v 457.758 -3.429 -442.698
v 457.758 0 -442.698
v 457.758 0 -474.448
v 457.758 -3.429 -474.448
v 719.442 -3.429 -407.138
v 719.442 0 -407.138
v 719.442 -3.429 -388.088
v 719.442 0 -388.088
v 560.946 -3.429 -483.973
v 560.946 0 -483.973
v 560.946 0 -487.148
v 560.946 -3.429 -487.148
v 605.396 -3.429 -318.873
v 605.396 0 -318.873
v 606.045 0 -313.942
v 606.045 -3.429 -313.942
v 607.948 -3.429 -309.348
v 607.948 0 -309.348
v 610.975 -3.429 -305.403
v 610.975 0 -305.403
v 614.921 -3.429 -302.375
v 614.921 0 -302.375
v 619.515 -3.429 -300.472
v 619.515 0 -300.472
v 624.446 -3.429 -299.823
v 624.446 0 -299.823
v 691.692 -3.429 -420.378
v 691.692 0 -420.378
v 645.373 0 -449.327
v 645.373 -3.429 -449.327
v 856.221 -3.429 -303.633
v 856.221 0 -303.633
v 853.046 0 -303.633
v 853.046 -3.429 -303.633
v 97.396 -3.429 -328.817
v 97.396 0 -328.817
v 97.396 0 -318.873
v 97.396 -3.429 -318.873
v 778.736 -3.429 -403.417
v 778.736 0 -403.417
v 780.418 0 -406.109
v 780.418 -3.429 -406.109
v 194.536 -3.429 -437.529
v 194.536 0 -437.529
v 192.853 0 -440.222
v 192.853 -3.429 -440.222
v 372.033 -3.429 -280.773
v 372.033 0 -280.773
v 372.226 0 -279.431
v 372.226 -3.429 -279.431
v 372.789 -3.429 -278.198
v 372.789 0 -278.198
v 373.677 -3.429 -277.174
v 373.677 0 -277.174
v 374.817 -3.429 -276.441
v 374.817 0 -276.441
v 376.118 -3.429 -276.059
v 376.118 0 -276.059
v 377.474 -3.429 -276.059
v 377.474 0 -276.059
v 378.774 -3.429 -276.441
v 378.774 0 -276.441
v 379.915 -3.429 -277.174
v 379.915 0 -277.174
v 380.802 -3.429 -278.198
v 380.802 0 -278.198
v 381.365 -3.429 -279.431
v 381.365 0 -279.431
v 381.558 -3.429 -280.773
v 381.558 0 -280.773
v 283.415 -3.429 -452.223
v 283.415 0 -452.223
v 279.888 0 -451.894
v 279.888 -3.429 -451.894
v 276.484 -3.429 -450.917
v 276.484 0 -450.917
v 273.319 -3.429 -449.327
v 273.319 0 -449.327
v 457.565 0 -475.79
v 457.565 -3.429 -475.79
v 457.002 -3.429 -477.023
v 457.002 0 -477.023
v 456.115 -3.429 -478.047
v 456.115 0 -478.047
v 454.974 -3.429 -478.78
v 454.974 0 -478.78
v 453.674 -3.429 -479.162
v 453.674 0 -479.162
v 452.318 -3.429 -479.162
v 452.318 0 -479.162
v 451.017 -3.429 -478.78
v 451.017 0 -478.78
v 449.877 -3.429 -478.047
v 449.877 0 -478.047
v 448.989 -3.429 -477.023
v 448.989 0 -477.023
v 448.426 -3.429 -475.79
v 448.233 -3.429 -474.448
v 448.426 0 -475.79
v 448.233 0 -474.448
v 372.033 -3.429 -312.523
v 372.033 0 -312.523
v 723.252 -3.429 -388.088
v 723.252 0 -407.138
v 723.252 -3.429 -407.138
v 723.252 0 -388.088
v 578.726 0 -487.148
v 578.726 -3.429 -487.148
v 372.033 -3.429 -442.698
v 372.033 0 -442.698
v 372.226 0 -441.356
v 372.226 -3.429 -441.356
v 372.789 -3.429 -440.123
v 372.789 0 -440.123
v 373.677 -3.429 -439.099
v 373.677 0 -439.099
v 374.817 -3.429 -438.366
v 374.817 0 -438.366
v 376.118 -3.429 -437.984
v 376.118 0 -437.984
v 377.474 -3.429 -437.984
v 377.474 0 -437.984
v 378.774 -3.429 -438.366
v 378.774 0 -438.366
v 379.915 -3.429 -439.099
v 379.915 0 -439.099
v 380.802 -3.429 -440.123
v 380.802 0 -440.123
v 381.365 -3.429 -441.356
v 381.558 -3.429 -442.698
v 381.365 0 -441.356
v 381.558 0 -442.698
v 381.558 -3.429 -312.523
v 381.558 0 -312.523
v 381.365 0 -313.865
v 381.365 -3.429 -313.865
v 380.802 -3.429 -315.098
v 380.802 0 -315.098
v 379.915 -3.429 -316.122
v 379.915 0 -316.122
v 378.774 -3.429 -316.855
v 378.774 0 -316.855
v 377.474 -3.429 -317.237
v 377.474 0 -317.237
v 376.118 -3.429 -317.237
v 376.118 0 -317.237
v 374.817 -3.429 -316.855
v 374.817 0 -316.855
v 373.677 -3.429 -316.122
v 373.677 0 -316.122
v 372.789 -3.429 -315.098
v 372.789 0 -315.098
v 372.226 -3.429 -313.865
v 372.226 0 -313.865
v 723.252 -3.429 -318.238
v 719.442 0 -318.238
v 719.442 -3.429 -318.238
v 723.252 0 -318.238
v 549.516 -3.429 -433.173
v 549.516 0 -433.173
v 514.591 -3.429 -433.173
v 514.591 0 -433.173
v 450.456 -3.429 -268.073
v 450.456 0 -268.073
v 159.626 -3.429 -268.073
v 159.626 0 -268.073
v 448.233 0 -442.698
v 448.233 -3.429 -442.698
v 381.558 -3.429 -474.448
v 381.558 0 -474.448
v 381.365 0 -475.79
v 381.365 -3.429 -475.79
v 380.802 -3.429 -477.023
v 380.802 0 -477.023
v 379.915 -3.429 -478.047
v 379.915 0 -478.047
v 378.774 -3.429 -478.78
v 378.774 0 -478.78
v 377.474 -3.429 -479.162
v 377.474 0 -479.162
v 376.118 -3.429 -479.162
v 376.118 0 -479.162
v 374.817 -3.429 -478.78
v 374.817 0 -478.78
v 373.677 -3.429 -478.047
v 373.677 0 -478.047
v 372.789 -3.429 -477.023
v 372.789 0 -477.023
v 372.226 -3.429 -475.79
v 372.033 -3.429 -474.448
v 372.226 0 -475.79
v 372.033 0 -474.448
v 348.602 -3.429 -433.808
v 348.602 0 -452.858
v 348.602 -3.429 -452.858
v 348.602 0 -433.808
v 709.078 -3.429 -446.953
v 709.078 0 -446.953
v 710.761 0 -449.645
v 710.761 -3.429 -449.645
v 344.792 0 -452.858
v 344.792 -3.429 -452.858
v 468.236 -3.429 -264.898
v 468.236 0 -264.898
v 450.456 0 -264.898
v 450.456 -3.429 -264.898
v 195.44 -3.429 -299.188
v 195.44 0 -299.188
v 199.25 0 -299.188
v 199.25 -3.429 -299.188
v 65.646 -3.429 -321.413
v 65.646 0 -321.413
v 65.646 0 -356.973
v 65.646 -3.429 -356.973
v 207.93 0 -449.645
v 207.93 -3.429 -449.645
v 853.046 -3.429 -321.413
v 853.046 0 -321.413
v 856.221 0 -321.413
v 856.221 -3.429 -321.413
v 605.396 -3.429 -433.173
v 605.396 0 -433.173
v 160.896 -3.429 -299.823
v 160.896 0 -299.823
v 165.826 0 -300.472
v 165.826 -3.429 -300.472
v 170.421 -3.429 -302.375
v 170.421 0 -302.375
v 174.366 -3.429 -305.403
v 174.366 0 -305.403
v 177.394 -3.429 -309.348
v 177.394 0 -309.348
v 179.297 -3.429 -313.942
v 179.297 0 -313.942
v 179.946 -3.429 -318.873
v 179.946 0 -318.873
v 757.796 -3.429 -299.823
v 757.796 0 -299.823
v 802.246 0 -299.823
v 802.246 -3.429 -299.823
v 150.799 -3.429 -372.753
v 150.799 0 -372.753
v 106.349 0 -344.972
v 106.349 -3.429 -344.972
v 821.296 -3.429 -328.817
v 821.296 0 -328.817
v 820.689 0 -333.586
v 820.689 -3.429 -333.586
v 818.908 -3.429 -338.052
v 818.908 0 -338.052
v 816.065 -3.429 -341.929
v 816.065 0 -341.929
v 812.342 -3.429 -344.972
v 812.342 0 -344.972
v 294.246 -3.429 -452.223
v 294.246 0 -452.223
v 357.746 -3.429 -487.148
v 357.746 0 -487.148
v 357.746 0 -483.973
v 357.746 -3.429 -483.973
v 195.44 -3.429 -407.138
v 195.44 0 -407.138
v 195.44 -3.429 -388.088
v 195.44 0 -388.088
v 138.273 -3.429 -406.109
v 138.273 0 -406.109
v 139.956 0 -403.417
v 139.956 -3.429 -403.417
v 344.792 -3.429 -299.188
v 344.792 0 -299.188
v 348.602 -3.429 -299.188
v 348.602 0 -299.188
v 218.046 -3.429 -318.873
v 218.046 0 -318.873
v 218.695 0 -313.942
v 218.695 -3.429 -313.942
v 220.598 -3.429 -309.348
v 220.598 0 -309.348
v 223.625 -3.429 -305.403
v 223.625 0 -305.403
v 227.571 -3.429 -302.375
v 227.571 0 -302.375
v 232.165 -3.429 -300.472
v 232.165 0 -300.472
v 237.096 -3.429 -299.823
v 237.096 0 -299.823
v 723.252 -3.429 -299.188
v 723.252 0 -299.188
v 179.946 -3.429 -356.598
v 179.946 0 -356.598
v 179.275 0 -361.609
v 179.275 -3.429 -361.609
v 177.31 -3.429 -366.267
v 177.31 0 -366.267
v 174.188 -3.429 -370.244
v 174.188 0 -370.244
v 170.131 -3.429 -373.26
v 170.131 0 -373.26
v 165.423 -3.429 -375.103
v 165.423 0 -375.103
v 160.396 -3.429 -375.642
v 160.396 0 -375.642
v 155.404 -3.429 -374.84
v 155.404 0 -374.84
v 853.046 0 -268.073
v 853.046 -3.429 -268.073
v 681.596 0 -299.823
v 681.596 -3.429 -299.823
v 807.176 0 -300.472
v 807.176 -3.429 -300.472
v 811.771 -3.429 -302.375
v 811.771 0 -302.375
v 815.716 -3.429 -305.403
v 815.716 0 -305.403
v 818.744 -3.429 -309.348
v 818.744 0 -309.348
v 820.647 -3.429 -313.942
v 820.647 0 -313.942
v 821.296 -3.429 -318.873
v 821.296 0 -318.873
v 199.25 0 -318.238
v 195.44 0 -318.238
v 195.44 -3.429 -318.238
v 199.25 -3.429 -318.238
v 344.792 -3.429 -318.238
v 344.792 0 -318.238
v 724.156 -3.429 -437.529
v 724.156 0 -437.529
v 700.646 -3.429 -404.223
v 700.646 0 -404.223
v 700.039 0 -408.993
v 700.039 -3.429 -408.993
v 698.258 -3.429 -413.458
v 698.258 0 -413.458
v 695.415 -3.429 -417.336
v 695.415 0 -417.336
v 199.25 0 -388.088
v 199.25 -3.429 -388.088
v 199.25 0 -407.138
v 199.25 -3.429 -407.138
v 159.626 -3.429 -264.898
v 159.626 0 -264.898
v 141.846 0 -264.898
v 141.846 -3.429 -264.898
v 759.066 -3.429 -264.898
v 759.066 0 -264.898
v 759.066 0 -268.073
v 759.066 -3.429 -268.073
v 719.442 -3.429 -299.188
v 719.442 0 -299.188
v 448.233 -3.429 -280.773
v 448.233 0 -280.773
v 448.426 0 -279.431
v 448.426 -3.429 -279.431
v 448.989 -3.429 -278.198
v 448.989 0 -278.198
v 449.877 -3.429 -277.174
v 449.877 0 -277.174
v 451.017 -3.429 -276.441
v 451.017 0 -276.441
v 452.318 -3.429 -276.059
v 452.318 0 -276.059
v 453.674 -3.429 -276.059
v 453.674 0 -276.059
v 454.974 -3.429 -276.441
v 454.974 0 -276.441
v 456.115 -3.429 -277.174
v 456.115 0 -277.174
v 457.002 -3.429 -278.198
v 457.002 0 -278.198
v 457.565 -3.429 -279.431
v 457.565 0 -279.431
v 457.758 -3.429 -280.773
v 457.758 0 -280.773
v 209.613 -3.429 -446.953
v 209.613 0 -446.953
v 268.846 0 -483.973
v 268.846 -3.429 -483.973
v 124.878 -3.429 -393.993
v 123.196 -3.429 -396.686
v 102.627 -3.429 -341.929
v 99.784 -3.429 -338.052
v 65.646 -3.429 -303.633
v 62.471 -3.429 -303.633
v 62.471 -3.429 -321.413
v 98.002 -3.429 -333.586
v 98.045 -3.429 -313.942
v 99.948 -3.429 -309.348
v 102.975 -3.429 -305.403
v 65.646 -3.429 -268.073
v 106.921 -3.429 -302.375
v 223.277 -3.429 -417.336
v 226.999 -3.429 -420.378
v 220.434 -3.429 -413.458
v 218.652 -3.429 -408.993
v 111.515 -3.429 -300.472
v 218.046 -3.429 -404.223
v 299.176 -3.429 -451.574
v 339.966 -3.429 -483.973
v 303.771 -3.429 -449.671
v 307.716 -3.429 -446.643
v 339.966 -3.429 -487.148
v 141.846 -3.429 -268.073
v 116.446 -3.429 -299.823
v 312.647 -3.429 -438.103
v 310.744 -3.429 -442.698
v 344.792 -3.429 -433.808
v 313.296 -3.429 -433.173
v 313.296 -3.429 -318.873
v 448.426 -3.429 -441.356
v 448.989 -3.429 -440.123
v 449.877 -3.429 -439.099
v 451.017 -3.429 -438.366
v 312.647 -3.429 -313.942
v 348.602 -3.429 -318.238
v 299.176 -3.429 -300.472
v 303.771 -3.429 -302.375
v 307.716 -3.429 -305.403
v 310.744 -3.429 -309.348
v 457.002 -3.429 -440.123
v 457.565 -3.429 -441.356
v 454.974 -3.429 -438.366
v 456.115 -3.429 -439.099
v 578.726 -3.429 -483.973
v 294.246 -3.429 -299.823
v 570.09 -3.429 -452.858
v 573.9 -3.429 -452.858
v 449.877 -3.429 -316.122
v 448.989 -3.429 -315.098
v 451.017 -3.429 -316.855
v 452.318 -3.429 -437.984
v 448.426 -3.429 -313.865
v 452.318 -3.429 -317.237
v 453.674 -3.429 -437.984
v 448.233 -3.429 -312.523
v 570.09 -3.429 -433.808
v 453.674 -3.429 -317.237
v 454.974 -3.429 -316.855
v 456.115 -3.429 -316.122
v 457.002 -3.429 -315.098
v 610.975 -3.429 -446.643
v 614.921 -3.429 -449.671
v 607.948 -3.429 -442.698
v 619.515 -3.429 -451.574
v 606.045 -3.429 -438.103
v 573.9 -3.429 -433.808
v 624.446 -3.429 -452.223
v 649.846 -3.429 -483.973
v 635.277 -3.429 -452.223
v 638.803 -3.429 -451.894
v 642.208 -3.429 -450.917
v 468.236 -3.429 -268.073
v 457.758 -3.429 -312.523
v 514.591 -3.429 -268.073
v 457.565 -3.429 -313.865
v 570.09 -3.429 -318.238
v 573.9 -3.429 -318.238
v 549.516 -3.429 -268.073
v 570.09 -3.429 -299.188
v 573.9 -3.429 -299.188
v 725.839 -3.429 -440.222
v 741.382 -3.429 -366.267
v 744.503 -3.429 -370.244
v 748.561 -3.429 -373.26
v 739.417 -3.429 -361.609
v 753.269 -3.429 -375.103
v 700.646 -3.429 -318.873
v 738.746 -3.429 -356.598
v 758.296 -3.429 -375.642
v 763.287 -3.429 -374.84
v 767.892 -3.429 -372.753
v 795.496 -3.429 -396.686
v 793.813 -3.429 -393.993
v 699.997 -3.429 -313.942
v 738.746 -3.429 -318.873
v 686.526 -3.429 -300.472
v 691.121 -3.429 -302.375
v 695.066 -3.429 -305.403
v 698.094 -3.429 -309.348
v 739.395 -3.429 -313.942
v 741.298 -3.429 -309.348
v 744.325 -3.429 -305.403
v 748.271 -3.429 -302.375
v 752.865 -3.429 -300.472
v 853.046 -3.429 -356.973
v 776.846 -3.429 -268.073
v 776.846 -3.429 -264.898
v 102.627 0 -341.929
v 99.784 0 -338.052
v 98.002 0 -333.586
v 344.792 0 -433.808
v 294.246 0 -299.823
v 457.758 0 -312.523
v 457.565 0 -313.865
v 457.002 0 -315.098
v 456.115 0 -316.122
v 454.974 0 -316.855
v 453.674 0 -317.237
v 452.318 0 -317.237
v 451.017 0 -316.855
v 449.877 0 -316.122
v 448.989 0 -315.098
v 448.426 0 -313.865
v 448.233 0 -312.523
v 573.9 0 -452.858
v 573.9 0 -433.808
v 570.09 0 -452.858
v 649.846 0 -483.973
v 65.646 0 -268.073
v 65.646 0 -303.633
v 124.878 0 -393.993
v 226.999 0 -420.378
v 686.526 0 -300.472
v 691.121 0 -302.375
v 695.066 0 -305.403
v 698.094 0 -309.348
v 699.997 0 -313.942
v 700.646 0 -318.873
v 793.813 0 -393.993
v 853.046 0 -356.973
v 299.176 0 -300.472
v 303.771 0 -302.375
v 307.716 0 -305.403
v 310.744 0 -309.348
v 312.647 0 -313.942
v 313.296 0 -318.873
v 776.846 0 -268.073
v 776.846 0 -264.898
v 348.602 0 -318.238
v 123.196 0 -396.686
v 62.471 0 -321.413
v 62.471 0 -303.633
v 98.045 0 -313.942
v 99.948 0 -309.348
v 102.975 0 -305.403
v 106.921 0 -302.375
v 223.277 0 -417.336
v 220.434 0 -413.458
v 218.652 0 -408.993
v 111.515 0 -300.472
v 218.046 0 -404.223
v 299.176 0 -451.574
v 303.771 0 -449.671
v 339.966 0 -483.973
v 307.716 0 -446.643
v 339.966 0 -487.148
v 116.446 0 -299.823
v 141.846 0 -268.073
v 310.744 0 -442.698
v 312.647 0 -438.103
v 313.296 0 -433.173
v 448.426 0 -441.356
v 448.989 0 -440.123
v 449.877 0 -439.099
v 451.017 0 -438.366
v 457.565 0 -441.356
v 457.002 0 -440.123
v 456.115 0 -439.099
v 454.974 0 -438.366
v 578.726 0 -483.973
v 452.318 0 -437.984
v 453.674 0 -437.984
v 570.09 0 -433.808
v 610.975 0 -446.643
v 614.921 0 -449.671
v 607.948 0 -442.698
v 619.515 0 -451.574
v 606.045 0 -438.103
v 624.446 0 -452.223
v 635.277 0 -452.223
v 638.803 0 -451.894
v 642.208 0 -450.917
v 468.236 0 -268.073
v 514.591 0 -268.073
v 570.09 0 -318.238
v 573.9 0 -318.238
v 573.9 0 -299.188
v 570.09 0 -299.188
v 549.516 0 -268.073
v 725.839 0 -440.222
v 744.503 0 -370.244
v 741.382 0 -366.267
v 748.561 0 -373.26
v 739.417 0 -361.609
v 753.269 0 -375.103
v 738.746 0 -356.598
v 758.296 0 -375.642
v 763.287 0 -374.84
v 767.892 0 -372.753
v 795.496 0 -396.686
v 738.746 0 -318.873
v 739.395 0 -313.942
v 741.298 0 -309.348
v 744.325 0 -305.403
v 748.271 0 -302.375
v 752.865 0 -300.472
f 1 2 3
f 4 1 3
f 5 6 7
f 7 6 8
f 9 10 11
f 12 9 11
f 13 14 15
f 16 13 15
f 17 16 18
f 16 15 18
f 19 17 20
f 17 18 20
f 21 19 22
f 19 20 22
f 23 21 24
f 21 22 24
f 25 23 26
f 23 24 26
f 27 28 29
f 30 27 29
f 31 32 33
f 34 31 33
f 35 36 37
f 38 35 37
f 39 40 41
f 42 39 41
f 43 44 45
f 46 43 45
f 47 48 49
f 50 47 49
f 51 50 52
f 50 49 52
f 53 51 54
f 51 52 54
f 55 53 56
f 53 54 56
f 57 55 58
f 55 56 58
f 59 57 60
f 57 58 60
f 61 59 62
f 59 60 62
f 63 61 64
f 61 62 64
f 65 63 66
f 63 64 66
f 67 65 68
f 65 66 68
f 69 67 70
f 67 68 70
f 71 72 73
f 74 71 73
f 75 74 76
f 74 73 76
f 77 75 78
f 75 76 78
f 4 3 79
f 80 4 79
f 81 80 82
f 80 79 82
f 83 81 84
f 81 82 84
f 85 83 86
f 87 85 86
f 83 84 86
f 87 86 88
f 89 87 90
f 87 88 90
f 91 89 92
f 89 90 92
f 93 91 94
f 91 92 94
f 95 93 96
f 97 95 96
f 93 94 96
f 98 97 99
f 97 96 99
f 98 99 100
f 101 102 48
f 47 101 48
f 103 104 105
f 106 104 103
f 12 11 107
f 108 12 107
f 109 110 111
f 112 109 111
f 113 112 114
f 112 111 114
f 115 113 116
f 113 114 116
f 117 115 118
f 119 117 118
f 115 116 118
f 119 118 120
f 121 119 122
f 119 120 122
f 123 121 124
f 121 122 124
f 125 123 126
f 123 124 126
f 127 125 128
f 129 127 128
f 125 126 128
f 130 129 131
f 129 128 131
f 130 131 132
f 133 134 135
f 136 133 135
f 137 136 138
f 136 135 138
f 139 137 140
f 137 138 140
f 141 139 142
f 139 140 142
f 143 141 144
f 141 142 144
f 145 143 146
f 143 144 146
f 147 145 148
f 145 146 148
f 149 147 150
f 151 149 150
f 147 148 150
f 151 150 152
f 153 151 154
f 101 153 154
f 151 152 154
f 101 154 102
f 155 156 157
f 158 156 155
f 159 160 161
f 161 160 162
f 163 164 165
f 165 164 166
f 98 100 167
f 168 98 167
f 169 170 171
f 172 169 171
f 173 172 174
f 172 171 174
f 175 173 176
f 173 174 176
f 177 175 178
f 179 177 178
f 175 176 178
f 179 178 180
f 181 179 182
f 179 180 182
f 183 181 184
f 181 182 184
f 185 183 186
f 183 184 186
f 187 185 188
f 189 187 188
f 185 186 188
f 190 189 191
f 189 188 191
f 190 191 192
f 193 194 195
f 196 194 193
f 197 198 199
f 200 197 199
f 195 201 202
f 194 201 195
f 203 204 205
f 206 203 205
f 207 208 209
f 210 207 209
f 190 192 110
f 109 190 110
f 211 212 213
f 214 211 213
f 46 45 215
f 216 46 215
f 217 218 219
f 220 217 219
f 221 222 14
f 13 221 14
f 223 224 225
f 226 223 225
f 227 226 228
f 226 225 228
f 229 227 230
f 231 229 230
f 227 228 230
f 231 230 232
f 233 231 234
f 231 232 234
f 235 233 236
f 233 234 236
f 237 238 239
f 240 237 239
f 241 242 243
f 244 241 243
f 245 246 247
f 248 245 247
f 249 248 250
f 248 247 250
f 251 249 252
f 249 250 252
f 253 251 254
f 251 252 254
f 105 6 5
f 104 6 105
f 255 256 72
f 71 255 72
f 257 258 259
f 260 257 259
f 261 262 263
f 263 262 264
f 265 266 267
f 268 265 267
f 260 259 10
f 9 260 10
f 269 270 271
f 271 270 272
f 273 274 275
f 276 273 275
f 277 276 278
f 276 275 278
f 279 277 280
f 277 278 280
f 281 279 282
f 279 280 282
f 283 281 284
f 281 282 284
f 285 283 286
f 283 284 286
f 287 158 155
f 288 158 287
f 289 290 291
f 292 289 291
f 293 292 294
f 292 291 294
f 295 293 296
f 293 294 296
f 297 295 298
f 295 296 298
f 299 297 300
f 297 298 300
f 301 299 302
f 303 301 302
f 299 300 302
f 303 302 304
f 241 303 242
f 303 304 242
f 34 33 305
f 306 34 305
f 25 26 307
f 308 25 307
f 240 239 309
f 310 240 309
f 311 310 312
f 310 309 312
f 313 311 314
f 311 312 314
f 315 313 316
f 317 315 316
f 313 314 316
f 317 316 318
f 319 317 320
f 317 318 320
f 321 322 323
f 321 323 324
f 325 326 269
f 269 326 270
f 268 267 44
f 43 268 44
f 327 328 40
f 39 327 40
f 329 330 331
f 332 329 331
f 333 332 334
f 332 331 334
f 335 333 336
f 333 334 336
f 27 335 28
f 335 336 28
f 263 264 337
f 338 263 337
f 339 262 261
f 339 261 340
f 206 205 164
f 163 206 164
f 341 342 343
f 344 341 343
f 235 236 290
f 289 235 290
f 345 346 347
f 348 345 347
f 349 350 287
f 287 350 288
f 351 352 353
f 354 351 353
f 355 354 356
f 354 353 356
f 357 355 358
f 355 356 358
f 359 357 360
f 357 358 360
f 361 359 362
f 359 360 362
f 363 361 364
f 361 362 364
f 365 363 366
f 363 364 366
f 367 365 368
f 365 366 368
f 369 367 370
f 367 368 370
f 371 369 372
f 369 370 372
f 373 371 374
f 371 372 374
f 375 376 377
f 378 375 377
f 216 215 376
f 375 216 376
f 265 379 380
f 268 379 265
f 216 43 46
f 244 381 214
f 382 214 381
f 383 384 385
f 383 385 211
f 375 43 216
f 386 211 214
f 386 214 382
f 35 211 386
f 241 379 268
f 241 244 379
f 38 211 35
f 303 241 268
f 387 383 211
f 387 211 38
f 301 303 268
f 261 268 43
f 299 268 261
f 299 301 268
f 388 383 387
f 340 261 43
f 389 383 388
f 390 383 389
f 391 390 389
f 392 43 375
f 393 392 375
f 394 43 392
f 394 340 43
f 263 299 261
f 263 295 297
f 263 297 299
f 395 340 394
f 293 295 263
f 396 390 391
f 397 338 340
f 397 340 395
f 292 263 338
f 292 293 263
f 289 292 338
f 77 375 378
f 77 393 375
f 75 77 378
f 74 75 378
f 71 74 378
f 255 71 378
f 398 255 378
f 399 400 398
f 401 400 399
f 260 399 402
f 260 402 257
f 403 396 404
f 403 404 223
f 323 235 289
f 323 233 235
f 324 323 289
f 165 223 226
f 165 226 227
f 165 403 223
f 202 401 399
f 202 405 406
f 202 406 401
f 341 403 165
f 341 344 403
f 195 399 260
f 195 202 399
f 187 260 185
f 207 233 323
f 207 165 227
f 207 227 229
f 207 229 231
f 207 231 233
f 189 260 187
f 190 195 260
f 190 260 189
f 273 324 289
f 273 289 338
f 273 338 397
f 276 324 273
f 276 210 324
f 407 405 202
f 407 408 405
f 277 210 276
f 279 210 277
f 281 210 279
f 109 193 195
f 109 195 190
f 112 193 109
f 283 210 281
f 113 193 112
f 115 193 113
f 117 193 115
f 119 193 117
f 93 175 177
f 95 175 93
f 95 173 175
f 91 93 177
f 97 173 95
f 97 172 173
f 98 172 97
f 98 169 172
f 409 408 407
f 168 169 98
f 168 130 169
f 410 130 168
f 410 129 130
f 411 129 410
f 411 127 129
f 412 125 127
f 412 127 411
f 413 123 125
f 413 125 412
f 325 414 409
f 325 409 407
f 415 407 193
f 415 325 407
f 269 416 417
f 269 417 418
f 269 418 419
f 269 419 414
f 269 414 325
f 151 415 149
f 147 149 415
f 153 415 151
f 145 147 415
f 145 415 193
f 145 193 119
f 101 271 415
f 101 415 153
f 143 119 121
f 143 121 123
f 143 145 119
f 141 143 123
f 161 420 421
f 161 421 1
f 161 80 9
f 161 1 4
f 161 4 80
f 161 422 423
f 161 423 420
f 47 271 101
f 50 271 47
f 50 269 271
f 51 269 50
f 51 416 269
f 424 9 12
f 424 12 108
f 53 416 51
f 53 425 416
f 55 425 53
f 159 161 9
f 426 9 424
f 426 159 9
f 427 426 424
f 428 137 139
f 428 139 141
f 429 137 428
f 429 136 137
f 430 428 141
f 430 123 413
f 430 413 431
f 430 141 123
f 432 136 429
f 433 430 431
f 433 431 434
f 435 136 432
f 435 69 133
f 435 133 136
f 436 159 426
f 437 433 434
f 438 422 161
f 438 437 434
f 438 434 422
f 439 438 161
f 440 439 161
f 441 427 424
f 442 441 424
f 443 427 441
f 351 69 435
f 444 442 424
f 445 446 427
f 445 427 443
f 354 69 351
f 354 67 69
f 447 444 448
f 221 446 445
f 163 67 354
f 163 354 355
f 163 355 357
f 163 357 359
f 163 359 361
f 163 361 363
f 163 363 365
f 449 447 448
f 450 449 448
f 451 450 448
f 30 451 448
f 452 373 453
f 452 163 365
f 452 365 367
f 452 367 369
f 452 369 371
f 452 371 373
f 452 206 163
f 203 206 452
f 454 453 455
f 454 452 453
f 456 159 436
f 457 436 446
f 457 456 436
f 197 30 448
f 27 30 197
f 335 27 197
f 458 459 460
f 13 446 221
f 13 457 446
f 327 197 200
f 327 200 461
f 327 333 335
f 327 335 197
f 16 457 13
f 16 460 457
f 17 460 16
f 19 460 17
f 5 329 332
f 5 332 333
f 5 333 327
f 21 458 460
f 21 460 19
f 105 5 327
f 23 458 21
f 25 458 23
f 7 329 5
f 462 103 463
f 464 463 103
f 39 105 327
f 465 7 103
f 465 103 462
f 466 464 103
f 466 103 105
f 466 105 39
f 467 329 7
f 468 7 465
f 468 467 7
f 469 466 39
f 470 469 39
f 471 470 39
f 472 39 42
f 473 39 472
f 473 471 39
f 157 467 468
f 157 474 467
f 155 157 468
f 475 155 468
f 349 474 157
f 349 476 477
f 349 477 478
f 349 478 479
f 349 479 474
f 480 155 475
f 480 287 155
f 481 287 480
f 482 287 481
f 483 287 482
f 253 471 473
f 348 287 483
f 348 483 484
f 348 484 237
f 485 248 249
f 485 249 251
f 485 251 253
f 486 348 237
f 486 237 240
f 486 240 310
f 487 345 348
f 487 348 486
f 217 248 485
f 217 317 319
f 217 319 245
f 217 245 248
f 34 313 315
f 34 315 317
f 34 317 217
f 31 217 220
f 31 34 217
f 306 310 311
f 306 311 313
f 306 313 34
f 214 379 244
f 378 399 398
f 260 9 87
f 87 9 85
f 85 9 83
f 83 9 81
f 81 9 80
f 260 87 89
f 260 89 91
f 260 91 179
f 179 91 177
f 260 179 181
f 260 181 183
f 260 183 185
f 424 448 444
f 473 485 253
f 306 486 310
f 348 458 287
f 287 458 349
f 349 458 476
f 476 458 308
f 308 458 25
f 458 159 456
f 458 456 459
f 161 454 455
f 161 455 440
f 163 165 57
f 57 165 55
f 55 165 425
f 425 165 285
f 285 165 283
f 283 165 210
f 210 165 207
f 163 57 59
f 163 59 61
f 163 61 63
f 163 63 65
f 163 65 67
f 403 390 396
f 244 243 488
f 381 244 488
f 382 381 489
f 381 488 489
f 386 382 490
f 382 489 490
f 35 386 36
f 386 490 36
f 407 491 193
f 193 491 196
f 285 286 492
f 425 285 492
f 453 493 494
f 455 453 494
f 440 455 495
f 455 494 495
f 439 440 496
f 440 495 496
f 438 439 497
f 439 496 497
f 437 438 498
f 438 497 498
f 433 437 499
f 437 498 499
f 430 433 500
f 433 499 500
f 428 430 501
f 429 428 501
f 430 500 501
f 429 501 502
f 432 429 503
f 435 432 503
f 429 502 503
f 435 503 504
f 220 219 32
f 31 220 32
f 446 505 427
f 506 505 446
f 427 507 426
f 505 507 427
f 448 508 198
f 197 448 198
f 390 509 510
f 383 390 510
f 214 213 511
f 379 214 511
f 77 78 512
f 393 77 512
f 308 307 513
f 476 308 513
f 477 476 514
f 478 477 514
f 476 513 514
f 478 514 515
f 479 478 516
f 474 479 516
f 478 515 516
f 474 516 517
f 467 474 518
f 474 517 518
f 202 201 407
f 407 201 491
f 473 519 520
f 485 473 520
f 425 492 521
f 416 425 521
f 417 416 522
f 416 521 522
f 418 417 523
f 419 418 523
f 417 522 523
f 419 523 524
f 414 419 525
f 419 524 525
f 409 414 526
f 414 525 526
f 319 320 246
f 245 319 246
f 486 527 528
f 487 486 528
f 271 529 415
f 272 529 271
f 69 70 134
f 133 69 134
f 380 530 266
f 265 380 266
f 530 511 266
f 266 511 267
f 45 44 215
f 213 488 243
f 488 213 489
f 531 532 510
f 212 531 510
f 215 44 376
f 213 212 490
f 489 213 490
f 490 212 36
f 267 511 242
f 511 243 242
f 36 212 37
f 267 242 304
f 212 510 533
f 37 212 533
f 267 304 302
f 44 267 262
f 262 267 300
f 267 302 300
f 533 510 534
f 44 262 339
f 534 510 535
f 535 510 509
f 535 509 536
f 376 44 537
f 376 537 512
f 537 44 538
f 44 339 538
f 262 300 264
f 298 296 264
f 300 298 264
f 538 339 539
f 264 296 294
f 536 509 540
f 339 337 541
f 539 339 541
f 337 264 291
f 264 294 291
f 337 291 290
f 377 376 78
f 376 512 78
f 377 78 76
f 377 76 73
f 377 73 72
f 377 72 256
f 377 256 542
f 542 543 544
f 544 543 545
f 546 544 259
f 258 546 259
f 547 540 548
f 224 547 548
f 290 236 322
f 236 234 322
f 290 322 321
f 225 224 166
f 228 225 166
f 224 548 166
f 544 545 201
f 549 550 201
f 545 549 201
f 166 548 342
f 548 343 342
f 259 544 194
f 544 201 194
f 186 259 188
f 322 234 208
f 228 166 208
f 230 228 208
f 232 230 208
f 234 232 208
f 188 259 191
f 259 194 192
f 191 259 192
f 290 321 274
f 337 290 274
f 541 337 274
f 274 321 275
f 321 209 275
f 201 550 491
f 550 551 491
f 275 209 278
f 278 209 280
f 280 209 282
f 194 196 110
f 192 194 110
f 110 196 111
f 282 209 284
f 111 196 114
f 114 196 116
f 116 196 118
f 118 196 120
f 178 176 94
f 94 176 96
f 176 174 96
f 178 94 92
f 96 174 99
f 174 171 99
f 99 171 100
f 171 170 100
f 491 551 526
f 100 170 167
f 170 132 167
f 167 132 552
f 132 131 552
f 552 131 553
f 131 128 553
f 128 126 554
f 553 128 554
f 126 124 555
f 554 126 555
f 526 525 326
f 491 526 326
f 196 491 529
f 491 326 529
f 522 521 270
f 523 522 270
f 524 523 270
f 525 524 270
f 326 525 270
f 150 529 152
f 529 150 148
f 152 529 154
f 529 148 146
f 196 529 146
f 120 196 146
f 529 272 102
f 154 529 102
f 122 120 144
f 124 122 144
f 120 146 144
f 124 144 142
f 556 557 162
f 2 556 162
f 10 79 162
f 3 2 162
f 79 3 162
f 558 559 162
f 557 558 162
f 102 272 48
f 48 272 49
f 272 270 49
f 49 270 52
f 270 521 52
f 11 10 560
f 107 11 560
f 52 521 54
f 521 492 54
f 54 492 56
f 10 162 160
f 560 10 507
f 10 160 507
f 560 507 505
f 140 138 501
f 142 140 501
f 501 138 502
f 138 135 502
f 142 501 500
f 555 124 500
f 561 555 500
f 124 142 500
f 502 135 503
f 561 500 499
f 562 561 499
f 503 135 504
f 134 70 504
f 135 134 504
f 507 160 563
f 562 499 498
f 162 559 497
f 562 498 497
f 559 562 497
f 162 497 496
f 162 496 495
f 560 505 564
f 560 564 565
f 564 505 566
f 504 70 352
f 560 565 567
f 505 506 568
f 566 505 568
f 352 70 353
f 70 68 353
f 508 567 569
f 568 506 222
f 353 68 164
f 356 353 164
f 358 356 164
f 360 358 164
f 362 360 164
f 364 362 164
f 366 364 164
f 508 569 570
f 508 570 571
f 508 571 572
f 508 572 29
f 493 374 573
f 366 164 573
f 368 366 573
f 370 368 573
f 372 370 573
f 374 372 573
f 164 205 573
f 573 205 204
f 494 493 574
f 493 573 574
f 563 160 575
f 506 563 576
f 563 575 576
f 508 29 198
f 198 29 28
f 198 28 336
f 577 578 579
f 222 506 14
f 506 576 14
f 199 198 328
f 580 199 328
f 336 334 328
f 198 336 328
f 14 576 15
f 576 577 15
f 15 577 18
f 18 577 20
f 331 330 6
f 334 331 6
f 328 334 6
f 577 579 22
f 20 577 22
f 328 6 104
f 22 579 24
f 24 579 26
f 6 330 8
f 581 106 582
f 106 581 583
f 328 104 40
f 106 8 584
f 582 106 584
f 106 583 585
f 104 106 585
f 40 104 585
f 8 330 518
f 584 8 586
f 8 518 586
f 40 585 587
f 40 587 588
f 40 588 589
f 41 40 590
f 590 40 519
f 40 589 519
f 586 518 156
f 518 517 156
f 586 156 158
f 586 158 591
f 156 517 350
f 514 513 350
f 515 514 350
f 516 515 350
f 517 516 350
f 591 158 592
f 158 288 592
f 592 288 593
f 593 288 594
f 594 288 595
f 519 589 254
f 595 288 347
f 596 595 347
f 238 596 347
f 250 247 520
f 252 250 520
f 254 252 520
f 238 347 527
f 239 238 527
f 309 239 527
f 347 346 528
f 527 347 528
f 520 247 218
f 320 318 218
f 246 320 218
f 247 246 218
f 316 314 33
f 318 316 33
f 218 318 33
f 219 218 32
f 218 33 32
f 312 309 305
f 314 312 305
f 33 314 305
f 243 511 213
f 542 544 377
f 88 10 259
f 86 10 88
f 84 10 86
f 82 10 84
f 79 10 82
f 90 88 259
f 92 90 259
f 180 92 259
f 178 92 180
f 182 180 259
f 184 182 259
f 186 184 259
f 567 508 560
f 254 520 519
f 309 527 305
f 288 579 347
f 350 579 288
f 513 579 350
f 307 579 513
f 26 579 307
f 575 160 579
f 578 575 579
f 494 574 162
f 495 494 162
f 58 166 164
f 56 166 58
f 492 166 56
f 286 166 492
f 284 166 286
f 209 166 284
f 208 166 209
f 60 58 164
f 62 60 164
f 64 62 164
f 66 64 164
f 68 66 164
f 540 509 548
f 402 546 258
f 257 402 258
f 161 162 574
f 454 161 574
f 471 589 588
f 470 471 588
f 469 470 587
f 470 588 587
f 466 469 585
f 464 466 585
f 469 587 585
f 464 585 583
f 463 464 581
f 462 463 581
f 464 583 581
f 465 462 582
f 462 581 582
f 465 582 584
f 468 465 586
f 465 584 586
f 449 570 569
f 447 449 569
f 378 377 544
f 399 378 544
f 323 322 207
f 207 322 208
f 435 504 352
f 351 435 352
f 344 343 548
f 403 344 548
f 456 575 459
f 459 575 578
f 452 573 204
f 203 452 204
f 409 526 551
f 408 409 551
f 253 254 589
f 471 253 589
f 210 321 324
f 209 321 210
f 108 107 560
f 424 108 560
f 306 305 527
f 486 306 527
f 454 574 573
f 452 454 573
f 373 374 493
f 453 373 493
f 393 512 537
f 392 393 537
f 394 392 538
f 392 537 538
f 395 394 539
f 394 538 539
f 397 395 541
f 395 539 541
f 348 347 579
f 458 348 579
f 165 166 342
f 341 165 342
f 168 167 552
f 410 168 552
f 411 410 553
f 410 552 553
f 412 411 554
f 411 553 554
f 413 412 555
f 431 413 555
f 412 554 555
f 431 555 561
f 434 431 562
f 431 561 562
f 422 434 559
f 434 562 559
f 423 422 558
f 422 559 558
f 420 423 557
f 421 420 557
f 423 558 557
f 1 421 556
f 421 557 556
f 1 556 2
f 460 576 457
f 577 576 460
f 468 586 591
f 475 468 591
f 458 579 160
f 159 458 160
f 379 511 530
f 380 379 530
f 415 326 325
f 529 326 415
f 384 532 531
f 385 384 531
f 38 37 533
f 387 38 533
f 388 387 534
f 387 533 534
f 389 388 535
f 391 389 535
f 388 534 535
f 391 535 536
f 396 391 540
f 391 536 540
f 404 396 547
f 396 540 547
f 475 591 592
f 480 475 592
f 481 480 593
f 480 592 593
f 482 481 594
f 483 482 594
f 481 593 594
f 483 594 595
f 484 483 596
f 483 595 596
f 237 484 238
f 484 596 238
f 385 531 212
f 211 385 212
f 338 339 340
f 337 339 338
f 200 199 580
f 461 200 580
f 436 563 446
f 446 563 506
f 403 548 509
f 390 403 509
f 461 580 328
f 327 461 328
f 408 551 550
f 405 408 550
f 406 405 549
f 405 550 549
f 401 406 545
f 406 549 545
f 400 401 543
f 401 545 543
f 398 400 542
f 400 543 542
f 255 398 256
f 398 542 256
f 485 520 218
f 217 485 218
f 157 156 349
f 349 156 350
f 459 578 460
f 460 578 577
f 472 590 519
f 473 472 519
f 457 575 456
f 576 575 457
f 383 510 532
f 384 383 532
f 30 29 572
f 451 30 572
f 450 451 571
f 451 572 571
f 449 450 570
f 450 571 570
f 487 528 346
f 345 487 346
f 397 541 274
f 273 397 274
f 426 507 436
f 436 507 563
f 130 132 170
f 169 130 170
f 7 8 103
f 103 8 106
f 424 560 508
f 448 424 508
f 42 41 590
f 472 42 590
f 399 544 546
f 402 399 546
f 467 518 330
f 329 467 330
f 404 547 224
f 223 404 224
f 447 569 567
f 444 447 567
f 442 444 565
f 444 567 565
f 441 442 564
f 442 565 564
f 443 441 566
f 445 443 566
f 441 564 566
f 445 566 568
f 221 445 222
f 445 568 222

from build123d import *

# Parameters (mm, degrees)
F0_W     = 3.81
F0_H     = 19.05
F1_DEPTH = 3.429


# Not quite as in the source:
# - ends of sketch curves that miss each other by under 0.0002 mm in the source are joined


with BuildPart() as f1:
    # F0 (on Front) → F1 (new body)
    with BuildSketch(Plane.XZ):
        Polygon((65.6458174, -303.6329462), (62.4708174, -303.6329462), (62.4708174, -321.4129462), (65.6458174, -321.4129462), (65.6458174, -356.9729462), (124.8784904, -393.99337), (123.1957404, -396.68577), (138.273155, -406.1091446), (139.955905, -403.4167446), (194.5357298, -437.5291224), (192.8529798, -440.2215224), (207.9303944, -449.644897), (209.6131444, -446.9525224), (268.8458174, -483.9729462), (339.9658174, -483.9729462), (339.9658174, -487.1479462), (357.7458174, -487.1479462), (357.7458174, -483.9729462), (560.9458174, -483.9729462), (560.9458174, -487.1479462), (578.7258174, -487.1479462), (578.7258174, -483.9729462), (649.8458174, -483.9729462), (709.0784904, -446.9525224), (710.7612404, -449.644897), (725.838655, -440.2215224), (724.155905, -437.5291224), (778.7357298, -403.4167446), (780.4184798, -406.1091446), (795.495869, -396.68577), (793.8131444, -393.99337), (853.0458174, -356.9729462), (853.0458174, -321.4129462), (856.2208174, -321.4129462), (856.2208174, -303.6329462), (853.0458174, -303.6329462), (853.0458174, -268.0729462), (776.8458174, -268.0729462), (776.8458174, -264.8979462), (759.0658174, -264.8979462), (759.0658174, -268.0729462), (549.5158174, -268.0729462), (549.5158174, -433.1729462), (514.5908174, -433.1729462), (514.5908174, -268.0729462), (468.2358174, -268.0729462), (468.2358174, -264.8979462), (450.4558174, -264.8979462), (450.4558174, -268.0729462), (159.6258174, -268.0729462), (159.6258174, -264.8979462), (141.8458174, -264.8979462), (141.8458174, -268.0729462), (65.6458174, -268.0729462), align=None)
        with Locations((346.6968174, -443.3329462)):
            Rectangle(F0_W, F0_H, mode=Mode.SUBTRACT)
        with BuildLine():
            ThreePointArc((372.0333174, -442.6979462), (376.7958174, -437.9354462), (381.5583174, -442.6979462))
            Line((381.5583174, -442.6979462), (381.5583174, -474.4479462))
            ThreePointArc((381.5583174, -474.4479462), (376.7958174, -479.2104462), (372.0333174, -474.4479462))
            Line((372.0333174, -474.4479462), (372.0333174, -442.6979462))
        make_face(mode=Mode.SUBTRACT)
        with BuildLine():
            ThreePointArc((457.7583174, -474.4479462), (452.9958174, -479.2104462), (448.2333174, -474.4479462))
            Line((448.2333174, -474.4479462), (448.2333174, -442.6979462))
            ThreePointArc((448.2333174, -442.6979462), (452.9958174, -437.9354462), (457.7583174, -442.6979462))
            Line((457.7583174, -442.6979462), (457.7583174, -474.4479462))
        make_face(mode=Mode.SUBTRACT)
        with Locations((197.3448174, -397.6129462)):
            Rectangle(F0_W, F0_H, mode=Mode.SUBTRACT)
        with Locations((571.9948174, -443.3329462)):
            Rectangle(F0_W, F0_H, mode=Mode.SUBTRACT)
        with Locations((721.3468174, -397.6129462)):
            Rectangle(F0_W, F0_H, mode=Mode.SUBTRACT)
        with BuildLine():
            ThreePointArc((179.9458174, -356.5983978), (170.1306614744, -373.26033511), (150.7993444424, -372.7527697722))
            Line((150.7993444424, -372.7527697722), (106.3493428, -344.9715224))
            ThreePointArc((106.3493428, -344.9715224), (99.78388009, -338.0519918744), (97.3958174, -328.8171478))
            Line((97.3958174, -328.8171478), (97.3958174, -318.8729462))
            ThreePointArc((97.3958174, -318.8729462), (102.9754332184, -305.4025620184), (116.4458174, -299.8229462))
            Line((116.4458174, -299.8229462), (160.8958174, -299.8229462))
            ThreePointArc((160.8958174, -299.8229462), (174.3662015816, -305.4025620184), (179.9458174, -318.8729462))
            Line((179.9458174, -318.8729462), (179.9458174, -356.5983978))
        make_face(mode=Mode.SUBTRACT)
        with BuildLine():
            ThreePointArc((226.9993444424, -420.3777697722), (220.43388009, -413.4582418744), (218.0458174, -404.2233978))
            Line((218.0458174, -404.2233978), (218.0458174, -318.8729462))
            ThreePointArc((218.0458174, -318.8729462), (223.6254332184, -305.4025620184), (237.0958174, -299.8229462))
            Line((237.0958174, -299.8229462), (294.2458174, -299.8229462))
            ThreePointArc((294.2458174, -299.8229462), (307.7162015816, -305.4025620184), (313.2958174, -318.8729462))
            Line((313.2958174, -318.8729462), (313.2958174, -433.1729462))
            ThreePointArc((313.2958174, -433.1729462), (307.7162015816, -446.6433303816), (294.2458174, -452.2229462))
            Line((294.2458174, -452.2229462), (283.4150542, -452.2229462))
            ThreePointArc((283.4150542, -452.2229462), (278.1632997385, -451.4847340722), (273.3185698266, -449.3273110374))
            Line((273.3185698266, -449.3273110374), (226.9993444424, -420.3777697722))
        make_face(mode=Mode.SUBTRACT)
        with Locations((197.3448174, -308.7129462)):
            Rectangle(F0_W, F0_H, mode=Mode.SUBTRACT)
        with Locations((346.6968174, -308.7129462)):
            Rectangle(F0_W, F0_H, mode=Mode.SUBTRACT)
        with BuildLine():
            ThreePointArc((372.0333174, -280.7729462), (376.7958174, -276.0104462), (381.5583174, -280.7729462))
            Line((381.5583174, -280.7729462), (381.5583174, -312.5229462))
            ThreePointArc((381.5583174, -312.5229462), (376.7958174, -317.2854462), (372.0333174, -312.5229462))
            Line((372.0333174, -312.5229462), (372.0333174, -280.7729462))
        make_face(mode=Mode.SUBTRACT)
        with BuildLine():
            ThreePointArc((457.7583174, -312.5229462), (452.9958174, -317.2854462), (448.2333174, -312.5229462))
            Line((448.2333174, -312.5229462), (448.2333174, -280.7729462))
            ThreePointArc((448.2333174, -280.7729462), (452.9958174, -276.0104462), (457.7583174, -280.7729462))
            Line((457.7583174, -280.7729462), (457.7583174, -312.5229462))
        make_face(mode=Mode.SUBTRACT)
        with BuildLine():
            ThreePointArc((624.4458174, -452.2229462), (610.9754332184, -446.6433303816), (605.3958174, -433.1729462))
            Line((605.3958174, -433.1729462), (605.3958174, -318.8729462))
            ThreePointArc((605.3958174, -318.8729462), (610.9754332184, -305.4025620184), (624.4458174, -299.8229462))
            Line((624.4458174, -299.8229462), (681.5958174, -299.8229462))
            ThreePointArc((681.5958174, -299.8229462), (695.0662015816, -305.4025620184), (700.6458174, -318.8729462))
            Line((700.6458174, -318.8729462), (700.6458174, -404.2233978))
            ThreePointArc((700.6458174, -404.2233978), (698.25775471, -413.4582418744), (691.6922903576, -420.3777697722))
            Line((691.6922903576, -420.3777697722), (645.3730552, -449.3272954))
            ThreePointArc((645.3730552, -449.3272954), (640.5283200138, -451.4847311032), (635.2765552, -452.2229462))
            Line((635.2765552, -452.2229462), (624.4458174, -452.2229462))
        make_face(mode=Mode.SUBTRACT)
        with BuildLine():
            ThreePointArc((738.7458174, -318.8729462), (744.3254332184, -305.4025620184), (757.7958174, -299.8229462))
            Line((757.7958174, -299.8229462), (802.2458174, -299.8229462))
            ThreePointArc((802.2458174, -299.8229462), (815.7162015816, -305.4025620184), (821.2958174, -318.8729462))
            Line((821.2958174, -318.8729462), (821.2958174, -328.8171478))
            ThreePointArc((821.2958174, -328.8171478), (818.90775471, -338.0519918744), (812.3422903576, -344.9715197722))
            Line((812.3422903576, -344.9715197722), (767.892292, -372.7527724))
            ThreePointArc((767.892292, -372.7527724), (748.5609733256, -373.26033511), (738.7458174, -356.5983978))
            Line((738.7458174, -356.5983978), (738.7458174, -318.8729462))
        make_face(mode=Mode.SUBTRACT)
        with Locations((571.9948174, -308.7129462)):
            Rectangle(F0_W, F0_H, mode=Mode.SUBTRACT)
        with Locations((721.3468174, -308.7129462)):
            Rectangle(F0_W, F0_H, mode=Mode.SUBTRACT)
    extrude(amount=F1_DEPTH)


solid = f1.part
